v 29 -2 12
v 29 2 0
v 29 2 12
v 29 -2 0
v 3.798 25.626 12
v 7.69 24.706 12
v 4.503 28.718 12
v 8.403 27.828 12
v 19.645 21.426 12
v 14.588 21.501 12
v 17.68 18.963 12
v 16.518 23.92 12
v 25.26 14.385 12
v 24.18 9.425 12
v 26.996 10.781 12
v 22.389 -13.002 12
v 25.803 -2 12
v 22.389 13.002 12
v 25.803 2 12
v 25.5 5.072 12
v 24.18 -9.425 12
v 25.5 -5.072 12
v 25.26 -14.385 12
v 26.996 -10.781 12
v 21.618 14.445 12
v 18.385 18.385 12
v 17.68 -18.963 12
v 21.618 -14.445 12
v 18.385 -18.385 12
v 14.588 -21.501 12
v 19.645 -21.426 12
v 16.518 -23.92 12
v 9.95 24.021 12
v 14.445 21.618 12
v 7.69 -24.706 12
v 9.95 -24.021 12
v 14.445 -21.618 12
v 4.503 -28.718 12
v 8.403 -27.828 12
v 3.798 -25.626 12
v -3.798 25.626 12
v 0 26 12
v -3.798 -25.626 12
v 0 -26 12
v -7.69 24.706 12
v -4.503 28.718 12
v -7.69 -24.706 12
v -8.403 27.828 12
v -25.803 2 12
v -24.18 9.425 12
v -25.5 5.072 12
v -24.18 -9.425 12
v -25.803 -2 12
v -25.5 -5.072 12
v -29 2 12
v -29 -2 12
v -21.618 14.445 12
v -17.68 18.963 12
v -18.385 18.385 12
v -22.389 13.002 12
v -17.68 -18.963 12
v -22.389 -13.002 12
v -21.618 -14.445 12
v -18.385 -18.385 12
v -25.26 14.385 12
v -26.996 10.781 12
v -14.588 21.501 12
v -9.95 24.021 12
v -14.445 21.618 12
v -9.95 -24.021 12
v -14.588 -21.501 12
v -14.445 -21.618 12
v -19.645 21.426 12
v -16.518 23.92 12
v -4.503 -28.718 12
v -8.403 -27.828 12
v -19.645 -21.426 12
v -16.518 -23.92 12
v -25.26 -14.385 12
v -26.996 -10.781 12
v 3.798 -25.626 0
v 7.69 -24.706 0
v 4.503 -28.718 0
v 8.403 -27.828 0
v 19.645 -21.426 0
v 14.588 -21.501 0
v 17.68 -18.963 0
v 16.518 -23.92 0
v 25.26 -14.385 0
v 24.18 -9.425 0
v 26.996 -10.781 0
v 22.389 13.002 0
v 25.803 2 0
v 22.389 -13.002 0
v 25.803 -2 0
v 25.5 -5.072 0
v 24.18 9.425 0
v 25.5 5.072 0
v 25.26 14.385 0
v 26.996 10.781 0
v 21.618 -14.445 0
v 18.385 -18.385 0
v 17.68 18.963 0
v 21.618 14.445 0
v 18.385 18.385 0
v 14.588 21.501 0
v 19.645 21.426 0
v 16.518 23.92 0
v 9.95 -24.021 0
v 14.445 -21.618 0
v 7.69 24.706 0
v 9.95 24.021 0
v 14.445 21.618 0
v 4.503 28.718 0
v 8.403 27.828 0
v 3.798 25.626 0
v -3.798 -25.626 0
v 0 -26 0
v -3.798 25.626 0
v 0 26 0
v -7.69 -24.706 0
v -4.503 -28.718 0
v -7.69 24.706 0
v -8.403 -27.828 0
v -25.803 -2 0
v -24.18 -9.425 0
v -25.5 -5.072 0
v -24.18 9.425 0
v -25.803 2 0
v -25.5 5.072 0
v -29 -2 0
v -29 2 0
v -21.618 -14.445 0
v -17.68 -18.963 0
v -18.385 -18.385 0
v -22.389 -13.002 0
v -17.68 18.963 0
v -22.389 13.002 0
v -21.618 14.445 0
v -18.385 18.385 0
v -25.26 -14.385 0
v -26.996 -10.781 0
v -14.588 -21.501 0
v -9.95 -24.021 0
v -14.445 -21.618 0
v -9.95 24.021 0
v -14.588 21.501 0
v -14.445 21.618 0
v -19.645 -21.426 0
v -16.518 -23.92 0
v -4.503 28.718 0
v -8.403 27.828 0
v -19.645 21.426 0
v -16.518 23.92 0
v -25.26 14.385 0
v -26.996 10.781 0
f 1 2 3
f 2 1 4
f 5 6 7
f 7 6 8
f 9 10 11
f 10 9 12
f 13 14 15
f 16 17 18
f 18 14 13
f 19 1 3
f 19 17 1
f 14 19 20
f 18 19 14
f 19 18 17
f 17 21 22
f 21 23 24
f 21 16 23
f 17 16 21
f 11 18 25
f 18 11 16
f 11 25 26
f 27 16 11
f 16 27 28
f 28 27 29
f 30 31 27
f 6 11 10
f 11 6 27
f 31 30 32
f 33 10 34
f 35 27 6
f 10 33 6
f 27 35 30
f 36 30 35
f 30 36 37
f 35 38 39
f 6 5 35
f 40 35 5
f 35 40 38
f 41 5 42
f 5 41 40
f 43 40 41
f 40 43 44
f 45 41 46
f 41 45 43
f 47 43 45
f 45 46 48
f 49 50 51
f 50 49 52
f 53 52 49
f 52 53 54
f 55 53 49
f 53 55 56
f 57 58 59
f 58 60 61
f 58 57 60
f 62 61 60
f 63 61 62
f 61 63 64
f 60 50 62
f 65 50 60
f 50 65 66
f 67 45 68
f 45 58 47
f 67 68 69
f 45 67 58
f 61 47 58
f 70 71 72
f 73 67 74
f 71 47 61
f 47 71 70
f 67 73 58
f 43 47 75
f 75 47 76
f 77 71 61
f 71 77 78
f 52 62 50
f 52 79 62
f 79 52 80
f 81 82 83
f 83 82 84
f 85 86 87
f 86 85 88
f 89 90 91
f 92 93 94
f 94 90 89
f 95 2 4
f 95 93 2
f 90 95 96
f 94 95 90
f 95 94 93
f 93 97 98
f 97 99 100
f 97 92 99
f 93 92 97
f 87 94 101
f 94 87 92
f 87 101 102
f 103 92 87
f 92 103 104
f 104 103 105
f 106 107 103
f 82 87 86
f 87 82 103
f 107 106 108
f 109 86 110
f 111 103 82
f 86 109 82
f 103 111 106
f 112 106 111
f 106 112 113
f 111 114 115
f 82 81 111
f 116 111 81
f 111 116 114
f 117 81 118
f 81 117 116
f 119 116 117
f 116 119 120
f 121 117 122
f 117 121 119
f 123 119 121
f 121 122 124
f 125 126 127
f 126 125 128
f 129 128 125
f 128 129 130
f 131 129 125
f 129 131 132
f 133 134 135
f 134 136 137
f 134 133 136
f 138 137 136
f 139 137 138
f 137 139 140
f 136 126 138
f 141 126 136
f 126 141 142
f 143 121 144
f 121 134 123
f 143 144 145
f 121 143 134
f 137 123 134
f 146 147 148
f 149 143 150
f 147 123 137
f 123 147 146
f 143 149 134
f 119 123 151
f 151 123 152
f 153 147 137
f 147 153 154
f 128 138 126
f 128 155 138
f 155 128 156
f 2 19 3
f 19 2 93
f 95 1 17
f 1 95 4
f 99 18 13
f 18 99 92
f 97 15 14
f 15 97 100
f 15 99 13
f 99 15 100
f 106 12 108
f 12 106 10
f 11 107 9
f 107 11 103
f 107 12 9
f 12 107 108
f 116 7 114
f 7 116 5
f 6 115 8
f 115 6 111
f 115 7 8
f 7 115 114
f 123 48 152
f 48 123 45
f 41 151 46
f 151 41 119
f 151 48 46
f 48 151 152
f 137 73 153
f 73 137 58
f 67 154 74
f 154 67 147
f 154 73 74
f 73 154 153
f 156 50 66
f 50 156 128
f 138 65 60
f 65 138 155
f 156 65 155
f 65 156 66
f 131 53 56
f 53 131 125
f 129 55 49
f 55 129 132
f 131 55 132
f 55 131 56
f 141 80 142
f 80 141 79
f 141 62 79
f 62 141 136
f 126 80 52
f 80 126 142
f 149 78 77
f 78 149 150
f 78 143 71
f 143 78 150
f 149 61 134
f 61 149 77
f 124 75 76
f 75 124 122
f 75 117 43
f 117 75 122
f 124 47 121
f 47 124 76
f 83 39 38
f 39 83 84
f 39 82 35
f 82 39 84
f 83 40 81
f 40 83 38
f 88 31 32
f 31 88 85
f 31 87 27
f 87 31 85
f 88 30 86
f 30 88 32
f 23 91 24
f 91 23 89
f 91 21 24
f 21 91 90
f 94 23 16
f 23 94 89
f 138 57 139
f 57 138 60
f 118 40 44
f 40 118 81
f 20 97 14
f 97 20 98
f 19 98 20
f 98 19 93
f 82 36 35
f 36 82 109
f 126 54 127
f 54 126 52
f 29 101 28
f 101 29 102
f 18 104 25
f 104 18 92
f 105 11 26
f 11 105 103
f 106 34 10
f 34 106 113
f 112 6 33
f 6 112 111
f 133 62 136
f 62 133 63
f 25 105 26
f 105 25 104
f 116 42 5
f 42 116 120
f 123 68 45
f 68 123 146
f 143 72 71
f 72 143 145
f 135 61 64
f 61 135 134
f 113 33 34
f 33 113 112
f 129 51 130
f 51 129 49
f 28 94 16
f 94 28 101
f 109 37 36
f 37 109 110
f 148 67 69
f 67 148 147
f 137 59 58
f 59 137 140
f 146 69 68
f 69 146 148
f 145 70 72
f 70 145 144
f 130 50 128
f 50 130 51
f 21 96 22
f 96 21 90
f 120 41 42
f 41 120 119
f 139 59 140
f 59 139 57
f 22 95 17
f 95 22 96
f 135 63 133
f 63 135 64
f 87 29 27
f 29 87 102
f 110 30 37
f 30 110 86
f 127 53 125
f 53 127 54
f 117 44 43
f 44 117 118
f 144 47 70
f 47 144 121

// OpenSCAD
$fn = 32;

// ----------------------------------------------------------------------
// Spur blank: plain gear blank
// ----------------------------------------------------------------------

// --- parameters (mm) ---
disc_r = 26;              // blank root radius
disc_t = 12;              // blank thickness
n_teeth = 14;             // stub tooth count
tooth_w = 4;              // tooth width at the root
tooth_h = 3;              // tooth height above the root

out_r = disc_r + tooth_h;  // tip radius
bbox_x = 58.0;  // measured width over the teeth
bbox_y = 57.44;  // measured depth over the teeth

union() {
  cylinder(r = disc_r, h = disc_t);
  for (i = [0 : n_teeth - 1])
    rotate([0, 0, i * 360 / n_teeth])
      translate([disc_r - 1, -tooth_w / 2, 0])
        cube([tooth_h + 1, tooth_w, disc_t]);
}
